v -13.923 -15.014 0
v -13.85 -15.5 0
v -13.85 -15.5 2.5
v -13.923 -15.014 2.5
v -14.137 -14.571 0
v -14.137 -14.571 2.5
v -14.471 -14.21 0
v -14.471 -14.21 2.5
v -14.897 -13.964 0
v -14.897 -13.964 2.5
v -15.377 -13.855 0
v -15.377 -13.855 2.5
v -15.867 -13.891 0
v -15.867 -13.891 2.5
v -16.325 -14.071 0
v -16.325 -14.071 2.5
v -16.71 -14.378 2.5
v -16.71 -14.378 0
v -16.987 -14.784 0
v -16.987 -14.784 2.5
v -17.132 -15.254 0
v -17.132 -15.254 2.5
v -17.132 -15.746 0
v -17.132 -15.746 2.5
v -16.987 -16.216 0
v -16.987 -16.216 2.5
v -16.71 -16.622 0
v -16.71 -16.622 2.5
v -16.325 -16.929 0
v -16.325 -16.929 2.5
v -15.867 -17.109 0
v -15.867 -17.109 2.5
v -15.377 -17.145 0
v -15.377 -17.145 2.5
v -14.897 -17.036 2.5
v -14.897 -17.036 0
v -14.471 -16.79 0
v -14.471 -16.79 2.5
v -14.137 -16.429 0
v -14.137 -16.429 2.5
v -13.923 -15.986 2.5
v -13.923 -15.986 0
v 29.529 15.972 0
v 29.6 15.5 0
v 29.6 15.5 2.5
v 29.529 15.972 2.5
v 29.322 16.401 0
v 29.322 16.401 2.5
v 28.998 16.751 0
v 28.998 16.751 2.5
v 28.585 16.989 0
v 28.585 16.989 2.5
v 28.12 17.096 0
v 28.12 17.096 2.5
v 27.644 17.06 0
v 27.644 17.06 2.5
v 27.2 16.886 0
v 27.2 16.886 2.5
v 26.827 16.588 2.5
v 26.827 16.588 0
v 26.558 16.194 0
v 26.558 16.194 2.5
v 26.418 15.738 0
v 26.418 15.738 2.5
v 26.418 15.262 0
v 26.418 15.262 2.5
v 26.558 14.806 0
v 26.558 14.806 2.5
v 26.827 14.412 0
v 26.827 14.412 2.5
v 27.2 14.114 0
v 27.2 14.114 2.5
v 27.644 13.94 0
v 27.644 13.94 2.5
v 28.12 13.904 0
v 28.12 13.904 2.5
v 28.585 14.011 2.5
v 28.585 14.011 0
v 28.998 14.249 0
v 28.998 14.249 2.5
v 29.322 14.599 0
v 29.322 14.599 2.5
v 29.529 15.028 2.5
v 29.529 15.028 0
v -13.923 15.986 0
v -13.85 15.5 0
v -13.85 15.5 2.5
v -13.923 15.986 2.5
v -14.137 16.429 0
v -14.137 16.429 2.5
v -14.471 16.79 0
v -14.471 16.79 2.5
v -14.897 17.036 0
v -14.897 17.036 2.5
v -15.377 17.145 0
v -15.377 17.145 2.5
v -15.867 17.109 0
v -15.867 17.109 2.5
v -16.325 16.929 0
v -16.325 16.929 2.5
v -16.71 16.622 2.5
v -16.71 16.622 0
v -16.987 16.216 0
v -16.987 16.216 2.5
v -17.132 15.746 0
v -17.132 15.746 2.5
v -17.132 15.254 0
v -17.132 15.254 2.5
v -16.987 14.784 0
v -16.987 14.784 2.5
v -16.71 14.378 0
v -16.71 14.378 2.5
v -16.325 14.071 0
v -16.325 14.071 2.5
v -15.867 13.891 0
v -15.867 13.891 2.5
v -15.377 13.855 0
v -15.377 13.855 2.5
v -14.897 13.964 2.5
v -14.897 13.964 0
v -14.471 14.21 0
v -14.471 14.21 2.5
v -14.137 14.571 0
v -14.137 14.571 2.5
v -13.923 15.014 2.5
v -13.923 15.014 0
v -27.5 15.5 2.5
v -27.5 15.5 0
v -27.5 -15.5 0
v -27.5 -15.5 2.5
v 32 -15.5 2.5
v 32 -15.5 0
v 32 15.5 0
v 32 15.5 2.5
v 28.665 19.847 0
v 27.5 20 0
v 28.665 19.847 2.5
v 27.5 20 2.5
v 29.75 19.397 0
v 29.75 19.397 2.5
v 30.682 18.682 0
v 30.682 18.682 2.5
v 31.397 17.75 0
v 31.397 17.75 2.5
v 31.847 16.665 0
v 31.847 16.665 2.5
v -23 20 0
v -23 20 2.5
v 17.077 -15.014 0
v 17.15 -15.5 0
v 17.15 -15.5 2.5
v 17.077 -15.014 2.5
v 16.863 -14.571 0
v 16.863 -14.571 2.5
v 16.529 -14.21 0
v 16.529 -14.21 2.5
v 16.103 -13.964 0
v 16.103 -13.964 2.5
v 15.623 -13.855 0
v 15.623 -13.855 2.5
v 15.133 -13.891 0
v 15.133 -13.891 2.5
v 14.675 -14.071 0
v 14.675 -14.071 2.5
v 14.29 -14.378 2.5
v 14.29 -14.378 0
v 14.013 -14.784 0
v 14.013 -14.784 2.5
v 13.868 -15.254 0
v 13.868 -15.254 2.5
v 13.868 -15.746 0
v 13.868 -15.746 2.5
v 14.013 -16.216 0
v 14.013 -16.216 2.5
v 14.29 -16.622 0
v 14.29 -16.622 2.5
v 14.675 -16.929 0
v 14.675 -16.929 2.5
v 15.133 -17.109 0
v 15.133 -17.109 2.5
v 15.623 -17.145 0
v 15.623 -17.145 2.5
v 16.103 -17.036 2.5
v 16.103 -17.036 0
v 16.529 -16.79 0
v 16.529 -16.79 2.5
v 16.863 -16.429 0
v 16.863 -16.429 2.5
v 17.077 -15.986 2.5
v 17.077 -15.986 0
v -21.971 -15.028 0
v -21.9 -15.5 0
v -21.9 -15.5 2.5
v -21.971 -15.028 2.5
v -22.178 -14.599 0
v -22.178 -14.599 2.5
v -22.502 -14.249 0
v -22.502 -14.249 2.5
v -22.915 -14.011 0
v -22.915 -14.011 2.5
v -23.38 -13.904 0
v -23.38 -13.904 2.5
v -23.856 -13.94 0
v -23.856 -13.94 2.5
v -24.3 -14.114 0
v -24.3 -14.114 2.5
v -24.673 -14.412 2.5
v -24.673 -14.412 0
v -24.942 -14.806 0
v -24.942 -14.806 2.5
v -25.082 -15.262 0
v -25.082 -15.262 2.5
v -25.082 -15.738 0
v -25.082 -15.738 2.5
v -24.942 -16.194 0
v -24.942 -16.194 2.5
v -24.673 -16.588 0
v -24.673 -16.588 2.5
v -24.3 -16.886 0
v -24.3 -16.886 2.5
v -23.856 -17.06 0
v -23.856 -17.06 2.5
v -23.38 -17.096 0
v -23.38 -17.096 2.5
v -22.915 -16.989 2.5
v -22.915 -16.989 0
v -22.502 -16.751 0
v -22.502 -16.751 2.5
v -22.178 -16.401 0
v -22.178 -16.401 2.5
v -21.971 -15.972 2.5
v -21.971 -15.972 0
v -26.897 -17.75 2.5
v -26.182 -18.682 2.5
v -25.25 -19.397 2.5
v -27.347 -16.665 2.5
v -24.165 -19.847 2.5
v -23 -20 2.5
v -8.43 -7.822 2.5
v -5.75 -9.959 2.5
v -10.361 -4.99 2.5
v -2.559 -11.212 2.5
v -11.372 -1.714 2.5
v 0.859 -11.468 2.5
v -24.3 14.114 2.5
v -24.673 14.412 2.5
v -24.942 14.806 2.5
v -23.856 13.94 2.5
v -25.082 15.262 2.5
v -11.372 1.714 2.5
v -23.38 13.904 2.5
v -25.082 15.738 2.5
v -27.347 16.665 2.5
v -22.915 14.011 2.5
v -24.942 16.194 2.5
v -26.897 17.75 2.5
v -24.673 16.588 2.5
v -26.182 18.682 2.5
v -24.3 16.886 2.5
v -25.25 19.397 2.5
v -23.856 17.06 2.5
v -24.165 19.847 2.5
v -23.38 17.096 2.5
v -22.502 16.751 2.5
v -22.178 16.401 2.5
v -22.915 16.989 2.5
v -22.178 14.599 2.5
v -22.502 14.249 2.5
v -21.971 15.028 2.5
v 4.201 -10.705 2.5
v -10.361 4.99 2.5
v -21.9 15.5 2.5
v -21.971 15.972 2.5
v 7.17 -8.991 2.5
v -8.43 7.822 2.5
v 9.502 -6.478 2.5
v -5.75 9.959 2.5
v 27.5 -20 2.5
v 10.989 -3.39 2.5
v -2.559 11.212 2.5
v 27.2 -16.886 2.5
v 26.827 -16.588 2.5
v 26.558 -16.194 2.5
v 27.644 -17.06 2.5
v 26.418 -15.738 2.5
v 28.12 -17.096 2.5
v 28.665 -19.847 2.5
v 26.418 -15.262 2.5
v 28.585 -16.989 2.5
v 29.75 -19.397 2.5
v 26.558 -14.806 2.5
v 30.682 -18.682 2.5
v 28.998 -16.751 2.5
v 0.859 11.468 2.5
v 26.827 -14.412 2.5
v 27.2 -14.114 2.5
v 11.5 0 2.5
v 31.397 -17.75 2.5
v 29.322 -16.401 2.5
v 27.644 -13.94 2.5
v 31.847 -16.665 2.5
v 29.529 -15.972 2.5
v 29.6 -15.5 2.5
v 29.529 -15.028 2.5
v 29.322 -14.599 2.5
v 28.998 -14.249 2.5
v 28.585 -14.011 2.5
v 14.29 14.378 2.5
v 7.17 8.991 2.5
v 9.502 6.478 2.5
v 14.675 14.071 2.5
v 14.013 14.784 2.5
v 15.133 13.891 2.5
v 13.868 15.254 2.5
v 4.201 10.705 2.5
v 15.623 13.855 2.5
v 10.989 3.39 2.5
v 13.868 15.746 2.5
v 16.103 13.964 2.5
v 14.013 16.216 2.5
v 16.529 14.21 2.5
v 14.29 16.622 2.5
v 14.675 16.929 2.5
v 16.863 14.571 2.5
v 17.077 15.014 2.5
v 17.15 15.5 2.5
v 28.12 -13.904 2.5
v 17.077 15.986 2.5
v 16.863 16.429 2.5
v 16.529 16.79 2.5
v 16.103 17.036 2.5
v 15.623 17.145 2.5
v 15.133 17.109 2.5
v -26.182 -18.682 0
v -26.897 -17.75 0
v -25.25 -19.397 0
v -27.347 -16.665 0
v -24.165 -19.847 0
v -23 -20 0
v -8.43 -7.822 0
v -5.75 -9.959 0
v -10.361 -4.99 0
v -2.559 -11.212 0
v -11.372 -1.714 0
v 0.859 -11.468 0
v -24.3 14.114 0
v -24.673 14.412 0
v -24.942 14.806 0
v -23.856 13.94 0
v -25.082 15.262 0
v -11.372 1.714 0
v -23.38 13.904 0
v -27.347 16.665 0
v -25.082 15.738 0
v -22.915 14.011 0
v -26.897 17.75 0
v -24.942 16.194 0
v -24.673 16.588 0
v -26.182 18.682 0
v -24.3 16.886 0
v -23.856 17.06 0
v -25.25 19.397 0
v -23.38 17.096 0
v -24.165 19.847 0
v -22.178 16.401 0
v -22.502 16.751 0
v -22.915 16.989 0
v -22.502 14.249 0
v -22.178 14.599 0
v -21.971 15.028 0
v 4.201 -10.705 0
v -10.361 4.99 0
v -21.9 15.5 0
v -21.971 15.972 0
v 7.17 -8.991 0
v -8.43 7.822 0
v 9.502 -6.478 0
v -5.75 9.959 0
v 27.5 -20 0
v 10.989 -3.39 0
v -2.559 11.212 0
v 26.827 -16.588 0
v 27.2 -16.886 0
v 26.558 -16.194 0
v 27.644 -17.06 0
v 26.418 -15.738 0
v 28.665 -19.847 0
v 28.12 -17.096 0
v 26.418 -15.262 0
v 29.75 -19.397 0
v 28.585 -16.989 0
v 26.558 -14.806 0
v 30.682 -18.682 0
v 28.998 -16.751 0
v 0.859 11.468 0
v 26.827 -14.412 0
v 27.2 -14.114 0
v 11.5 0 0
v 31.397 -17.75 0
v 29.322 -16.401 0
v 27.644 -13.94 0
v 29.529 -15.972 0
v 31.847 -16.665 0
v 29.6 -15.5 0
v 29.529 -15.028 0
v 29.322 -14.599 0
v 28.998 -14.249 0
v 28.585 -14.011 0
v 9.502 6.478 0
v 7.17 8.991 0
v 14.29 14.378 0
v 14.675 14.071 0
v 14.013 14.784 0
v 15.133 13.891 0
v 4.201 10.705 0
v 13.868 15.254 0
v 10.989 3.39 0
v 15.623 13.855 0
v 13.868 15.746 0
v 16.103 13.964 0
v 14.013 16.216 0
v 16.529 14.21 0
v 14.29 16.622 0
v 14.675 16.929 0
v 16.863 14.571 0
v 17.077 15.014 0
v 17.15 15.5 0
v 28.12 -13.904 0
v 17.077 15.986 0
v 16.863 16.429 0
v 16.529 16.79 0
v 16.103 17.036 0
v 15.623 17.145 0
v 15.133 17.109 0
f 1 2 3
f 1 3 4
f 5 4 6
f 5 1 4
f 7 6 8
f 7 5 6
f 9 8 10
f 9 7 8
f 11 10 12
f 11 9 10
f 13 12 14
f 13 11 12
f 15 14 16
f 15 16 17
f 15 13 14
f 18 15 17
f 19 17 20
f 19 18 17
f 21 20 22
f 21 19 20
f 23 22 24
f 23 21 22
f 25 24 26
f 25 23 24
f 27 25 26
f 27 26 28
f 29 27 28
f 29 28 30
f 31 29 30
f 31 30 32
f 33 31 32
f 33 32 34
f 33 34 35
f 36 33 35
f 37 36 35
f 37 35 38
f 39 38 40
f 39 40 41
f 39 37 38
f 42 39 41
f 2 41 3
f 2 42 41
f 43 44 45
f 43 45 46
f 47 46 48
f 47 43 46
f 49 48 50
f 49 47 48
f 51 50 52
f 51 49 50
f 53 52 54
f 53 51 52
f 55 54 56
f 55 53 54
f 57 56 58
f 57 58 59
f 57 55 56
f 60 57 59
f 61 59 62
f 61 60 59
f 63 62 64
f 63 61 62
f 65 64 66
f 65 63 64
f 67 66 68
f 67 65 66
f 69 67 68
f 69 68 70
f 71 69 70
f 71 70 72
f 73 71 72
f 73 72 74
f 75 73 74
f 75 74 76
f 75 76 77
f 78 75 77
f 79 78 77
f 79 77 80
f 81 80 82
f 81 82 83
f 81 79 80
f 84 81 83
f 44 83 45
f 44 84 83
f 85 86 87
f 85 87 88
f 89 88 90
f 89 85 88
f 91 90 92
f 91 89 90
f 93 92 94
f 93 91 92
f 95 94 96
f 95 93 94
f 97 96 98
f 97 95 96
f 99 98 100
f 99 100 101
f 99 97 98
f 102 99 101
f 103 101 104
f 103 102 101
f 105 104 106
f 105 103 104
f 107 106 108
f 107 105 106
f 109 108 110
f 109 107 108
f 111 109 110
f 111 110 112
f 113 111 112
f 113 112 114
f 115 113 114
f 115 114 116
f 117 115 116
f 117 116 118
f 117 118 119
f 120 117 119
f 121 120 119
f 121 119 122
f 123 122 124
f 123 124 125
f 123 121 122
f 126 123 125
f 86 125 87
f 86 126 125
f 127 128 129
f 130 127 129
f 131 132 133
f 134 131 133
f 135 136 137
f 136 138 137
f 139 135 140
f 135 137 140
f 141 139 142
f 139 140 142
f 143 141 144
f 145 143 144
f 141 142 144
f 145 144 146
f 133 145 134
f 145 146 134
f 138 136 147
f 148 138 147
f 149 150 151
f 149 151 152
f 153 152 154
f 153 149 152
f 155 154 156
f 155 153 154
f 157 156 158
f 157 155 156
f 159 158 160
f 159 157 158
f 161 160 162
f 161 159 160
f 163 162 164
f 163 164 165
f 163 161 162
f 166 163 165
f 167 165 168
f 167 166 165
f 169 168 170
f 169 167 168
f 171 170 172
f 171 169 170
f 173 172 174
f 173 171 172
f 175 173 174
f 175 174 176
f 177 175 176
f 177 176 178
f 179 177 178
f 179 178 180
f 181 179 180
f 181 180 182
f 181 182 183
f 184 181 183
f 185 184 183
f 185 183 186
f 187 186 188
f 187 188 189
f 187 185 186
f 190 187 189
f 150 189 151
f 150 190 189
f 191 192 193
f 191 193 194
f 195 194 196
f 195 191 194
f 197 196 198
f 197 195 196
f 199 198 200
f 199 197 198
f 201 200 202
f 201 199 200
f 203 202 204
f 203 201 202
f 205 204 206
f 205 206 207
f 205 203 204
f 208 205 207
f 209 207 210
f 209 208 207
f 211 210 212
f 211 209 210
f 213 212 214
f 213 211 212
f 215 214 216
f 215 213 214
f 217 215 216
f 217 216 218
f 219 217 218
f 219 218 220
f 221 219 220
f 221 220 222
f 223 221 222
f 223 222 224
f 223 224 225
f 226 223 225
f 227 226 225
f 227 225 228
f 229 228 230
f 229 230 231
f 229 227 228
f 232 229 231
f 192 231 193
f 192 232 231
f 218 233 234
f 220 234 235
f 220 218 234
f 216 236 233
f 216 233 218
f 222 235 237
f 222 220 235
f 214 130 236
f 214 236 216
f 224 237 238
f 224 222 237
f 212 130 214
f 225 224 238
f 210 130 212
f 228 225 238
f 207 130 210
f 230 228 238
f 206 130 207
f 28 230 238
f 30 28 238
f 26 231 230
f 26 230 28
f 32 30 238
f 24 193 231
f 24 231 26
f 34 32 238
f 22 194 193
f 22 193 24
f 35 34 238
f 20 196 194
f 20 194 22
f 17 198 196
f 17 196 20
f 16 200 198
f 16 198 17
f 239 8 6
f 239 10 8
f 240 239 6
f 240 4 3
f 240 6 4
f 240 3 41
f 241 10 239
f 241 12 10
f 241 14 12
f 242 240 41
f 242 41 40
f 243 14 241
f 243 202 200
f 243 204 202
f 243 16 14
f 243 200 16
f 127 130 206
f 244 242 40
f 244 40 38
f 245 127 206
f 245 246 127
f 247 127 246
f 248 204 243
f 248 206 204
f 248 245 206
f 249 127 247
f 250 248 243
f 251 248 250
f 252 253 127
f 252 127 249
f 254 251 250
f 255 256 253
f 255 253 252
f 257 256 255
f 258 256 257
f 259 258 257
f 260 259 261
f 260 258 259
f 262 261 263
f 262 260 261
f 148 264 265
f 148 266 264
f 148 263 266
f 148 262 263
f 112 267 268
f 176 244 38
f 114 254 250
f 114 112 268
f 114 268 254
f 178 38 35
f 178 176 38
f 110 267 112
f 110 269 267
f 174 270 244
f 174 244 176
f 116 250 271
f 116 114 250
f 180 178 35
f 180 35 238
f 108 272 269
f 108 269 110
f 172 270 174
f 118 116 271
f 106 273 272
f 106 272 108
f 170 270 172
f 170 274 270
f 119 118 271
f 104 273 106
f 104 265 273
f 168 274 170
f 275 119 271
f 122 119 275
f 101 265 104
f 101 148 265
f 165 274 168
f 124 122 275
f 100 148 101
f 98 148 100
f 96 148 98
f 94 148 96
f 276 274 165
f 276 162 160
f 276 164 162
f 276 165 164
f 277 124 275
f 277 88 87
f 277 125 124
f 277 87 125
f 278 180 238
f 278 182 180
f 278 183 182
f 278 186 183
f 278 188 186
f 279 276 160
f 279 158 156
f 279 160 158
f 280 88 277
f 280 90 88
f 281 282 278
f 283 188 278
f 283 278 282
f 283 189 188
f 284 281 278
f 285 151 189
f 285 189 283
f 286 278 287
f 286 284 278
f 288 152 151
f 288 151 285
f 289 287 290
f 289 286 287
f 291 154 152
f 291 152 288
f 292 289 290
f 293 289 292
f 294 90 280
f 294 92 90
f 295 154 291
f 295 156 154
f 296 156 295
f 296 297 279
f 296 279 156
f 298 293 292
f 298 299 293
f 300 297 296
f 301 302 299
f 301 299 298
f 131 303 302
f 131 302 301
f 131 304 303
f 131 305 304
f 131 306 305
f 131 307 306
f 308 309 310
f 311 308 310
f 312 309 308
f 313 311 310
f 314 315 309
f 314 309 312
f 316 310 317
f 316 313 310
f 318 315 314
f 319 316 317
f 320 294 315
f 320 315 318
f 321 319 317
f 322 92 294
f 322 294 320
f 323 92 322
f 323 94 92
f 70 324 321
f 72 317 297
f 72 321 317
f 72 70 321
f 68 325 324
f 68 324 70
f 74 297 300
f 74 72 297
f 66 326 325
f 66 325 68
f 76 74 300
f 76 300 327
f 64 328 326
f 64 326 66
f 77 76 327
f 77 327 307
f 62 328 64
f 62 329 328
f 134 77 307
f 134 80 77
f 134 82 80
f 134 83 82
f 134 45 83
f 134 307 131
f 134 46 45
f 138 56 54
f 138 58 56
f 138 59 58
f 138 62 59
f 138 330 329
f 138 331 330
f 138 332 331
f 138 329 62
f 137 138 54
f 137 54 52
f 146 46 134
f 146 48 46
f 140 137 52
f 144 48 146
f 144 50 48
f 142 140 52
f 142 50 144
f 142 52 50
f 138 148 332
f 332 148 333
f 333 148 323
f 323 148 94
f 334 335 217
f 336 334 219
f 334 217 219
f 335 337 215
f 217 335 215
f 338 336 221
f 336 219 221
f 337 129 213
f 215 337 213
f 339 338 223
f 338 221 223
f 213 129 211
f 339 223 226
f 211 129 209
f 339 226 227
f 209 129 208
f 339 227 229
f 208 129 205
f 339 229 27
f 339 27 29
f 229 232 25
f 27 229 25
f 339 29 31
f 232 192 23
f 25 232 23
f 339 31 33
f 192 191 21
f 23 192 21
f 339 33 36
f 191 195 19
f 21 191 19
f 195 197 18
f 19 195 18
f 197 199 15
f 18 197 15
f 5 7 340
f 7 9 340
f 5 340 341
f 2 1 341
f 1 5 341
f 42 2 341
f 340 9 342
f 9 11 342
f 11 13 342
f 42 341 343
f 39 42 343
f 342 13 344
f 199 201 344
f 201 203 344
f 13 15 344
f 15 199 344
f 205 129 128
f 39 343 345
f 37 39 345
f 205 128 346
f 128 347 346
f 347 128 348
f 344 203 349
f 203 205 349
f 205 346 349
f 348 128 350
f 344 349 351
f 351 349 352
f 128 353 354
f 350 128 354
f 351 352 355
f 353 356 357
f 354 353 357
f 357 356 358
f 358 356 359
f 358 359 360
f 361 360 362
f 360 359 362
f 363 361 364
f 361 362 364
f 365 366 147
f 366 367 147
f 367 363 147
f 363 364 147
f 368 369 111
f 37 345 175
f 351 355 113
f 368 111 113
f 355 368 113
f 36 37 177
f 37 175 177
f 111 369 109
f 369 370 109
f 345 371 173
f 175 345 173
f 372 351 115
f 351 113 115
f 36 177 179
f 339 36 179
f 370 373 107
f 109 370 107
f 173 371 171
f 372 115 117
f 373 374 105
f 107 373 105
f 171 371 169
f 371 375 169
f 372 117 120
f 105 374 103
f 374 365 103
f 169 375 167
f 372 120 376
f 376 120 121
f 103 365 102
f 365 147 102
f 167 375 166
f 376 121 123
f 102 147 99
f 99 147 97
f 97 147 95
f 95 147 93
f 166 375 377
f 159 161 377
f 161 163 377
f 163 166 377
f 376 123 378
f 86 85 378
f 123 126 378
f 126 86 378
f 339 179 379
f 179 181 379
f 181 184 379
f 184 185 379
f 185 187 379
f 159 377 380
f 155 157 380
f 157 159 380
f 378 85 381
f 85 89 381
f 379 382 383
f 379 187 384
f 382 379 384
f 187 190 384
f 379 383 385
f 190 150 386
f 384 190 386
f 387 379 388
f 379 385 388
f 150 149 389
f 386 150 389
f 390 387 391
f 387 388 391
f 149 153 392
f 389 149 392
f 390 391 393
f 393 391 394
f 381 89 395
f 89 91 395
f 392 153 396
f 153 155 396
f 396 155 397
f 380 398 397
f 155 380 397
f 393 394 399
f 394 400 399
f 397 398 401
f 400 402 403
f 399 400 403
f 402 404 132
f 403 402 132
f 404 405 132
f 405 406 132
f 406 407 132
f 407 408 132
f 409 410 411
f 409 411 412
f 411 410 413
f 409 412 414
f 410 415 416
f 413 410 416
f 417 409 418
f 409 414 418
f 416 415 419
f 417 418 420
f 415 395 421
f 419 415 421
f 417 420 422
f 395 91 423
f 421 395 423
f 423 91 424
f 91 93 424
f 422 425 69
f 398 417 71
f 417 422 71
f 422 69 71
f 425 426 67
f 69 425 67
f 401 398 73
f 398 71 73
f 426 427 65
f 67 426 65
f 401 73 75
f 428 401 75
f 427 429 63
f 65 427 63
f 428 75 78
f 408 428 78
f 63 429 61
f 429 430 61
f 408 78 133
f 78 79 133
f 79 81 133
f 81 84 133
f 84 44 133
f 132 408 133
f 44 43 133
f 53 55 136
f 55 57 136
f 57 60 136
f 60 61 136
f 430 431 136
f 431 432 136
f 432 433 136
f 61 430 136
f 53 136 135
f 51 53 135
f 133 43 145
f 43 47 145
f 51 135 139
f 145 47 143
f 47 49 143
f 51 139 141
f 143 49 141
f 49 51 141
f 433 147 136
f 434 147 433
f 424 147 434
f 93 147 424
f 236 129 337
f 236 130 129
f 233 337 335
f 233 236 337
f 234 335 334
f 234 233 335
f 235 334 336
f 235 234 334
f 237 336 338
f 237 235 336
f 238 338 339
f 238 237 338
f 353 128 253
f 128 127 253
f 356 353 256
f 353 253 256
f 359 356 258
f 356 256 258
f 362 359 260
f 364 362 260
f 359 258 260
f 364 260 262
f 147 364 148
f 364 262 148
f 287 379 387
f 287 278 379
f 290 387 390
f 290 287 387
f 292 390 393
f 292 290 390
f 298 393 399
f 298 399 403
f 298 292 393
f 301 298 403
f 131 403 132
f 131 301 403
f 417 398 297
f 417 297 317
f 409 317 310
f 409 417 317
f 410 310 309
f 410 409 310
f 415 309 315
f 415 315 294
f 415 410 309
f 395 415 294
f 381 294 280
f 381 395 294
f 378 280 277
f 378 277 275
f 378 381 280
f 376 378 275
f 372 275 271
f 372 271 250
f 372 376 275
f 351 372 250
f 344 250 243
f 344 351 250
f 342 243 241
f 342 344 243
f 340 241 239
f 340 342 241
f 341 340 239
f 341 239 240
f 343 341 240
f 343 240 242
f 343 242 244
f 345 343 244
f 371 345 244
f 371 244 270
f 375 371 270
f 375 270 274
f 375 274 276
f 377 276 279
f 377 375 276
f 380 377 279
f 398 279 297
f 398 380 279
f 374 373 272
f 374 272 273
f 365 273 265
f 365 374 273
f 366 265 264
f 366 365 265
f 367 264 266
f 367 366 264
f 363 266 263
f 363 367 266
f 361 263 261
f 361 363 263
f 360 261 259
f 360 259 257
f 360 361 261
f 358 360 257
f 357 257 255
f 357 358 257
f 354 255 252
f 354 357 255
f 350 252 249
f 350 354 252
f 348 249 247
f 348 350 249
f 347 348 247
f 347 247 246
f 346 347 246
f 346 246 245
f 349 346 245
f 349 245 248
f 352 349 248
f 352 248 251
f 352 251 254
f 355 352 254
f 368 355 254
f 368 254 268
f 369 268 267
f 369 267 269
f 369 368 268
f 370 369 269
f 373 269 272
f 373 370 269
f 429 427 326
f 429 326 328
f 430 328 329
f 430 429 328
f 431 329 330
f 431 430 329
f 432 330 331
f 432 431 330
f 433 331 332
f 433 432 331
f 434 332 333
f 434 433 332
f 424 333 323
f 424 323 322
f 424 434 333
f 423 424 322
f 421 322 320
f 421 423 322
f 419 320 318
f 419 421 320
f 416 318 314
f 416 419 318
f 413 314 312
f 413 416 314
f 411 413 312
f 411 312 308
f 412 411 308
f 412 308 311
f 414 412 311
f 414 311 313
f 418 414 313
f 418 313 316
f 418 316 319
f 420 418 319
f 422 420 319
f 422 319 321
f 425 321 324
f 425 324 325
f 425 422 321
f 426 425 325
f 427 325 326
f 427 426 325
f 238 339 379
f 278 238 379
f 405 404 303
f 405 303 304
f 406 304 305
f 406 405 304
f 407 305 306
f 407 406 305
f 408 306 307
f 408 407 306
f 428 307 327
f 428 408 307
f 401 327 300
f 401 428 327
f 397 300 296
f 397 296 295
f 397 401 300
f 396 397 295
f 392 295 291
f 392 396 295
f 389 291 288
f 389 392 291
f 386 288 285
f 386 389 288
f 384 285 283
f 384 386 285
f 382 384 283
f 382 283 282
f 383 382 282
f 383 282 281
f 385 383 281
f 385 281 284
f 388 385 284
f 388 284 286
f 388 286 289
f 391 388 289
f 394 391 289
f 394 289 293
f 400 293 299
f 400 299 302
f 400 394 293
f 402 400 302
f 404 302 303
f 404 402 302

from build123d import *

# Parameters (mm, degrees)
SKETCH_R   = 1.65
SKETCH_R_2 = 11.5
SKETCH_R_3 = 1.6
PAD_DEPTH  = 2.5
FILLET_R   = 4.5


with BuildPart() as part:
    # Sketch → Pad (new body)
    with BuildSketch(Plane.XY):
        Polygon((20, 20), (-20, 20), (-27.5, 20), (-27.5, -20), (-20, -20), (20, -20), (32, -20), (32, 20), align=None)
        with Locations((-15.5, 15.5)):
            Circle(SKETCH_R, mode=Mode.SUBTRACT)
        with Locations((15.5, 15.5)):
            Circle(SKETCH_R, mode=Mode.SUBTRACT)
        with Locations((15.5, -15.5)):
            Circle(SKETCH_R, mode=Mode.SUBTRACT)
        with Locations((-15.5, -15.5)):
            Circle(SKETCH_R, mode=Mode.SUBTRACT)
        Circle(SKETCH_R_2, mode=Mode.SUBTRACT)
        with Locations((-23.5, 15.5)):
            Circle(SKETCH_R_3, mode=Mode.SUBTRACT)
        with Locations((-23.5, -15.5)):
            Circle(SKETCH_R_3, mode=Mode.SUBTRACT)
        with Locations((28, 15.5)):
            Circle(SKETCH_R_3, mode=Mode.SUBTRACT)
        with Locations((28, -15.5)):
            Circle(SKETCH_R_3, mode=Mode.SUBTRACT)
    extrude(amount=PAD_DEPTH)

    # Fillet
    fillet_edges = [part.edges().sort_by_distance(p)[0] for p in [
        (32, -20, 1.25),
        (32, 20, 1.25),
        (-27.5, 20, 1.25),
        (-27.5, -20, 1.25),
    ]]
    fillet(fillet_edges, radius=FILLET_R)


solid = part.part
